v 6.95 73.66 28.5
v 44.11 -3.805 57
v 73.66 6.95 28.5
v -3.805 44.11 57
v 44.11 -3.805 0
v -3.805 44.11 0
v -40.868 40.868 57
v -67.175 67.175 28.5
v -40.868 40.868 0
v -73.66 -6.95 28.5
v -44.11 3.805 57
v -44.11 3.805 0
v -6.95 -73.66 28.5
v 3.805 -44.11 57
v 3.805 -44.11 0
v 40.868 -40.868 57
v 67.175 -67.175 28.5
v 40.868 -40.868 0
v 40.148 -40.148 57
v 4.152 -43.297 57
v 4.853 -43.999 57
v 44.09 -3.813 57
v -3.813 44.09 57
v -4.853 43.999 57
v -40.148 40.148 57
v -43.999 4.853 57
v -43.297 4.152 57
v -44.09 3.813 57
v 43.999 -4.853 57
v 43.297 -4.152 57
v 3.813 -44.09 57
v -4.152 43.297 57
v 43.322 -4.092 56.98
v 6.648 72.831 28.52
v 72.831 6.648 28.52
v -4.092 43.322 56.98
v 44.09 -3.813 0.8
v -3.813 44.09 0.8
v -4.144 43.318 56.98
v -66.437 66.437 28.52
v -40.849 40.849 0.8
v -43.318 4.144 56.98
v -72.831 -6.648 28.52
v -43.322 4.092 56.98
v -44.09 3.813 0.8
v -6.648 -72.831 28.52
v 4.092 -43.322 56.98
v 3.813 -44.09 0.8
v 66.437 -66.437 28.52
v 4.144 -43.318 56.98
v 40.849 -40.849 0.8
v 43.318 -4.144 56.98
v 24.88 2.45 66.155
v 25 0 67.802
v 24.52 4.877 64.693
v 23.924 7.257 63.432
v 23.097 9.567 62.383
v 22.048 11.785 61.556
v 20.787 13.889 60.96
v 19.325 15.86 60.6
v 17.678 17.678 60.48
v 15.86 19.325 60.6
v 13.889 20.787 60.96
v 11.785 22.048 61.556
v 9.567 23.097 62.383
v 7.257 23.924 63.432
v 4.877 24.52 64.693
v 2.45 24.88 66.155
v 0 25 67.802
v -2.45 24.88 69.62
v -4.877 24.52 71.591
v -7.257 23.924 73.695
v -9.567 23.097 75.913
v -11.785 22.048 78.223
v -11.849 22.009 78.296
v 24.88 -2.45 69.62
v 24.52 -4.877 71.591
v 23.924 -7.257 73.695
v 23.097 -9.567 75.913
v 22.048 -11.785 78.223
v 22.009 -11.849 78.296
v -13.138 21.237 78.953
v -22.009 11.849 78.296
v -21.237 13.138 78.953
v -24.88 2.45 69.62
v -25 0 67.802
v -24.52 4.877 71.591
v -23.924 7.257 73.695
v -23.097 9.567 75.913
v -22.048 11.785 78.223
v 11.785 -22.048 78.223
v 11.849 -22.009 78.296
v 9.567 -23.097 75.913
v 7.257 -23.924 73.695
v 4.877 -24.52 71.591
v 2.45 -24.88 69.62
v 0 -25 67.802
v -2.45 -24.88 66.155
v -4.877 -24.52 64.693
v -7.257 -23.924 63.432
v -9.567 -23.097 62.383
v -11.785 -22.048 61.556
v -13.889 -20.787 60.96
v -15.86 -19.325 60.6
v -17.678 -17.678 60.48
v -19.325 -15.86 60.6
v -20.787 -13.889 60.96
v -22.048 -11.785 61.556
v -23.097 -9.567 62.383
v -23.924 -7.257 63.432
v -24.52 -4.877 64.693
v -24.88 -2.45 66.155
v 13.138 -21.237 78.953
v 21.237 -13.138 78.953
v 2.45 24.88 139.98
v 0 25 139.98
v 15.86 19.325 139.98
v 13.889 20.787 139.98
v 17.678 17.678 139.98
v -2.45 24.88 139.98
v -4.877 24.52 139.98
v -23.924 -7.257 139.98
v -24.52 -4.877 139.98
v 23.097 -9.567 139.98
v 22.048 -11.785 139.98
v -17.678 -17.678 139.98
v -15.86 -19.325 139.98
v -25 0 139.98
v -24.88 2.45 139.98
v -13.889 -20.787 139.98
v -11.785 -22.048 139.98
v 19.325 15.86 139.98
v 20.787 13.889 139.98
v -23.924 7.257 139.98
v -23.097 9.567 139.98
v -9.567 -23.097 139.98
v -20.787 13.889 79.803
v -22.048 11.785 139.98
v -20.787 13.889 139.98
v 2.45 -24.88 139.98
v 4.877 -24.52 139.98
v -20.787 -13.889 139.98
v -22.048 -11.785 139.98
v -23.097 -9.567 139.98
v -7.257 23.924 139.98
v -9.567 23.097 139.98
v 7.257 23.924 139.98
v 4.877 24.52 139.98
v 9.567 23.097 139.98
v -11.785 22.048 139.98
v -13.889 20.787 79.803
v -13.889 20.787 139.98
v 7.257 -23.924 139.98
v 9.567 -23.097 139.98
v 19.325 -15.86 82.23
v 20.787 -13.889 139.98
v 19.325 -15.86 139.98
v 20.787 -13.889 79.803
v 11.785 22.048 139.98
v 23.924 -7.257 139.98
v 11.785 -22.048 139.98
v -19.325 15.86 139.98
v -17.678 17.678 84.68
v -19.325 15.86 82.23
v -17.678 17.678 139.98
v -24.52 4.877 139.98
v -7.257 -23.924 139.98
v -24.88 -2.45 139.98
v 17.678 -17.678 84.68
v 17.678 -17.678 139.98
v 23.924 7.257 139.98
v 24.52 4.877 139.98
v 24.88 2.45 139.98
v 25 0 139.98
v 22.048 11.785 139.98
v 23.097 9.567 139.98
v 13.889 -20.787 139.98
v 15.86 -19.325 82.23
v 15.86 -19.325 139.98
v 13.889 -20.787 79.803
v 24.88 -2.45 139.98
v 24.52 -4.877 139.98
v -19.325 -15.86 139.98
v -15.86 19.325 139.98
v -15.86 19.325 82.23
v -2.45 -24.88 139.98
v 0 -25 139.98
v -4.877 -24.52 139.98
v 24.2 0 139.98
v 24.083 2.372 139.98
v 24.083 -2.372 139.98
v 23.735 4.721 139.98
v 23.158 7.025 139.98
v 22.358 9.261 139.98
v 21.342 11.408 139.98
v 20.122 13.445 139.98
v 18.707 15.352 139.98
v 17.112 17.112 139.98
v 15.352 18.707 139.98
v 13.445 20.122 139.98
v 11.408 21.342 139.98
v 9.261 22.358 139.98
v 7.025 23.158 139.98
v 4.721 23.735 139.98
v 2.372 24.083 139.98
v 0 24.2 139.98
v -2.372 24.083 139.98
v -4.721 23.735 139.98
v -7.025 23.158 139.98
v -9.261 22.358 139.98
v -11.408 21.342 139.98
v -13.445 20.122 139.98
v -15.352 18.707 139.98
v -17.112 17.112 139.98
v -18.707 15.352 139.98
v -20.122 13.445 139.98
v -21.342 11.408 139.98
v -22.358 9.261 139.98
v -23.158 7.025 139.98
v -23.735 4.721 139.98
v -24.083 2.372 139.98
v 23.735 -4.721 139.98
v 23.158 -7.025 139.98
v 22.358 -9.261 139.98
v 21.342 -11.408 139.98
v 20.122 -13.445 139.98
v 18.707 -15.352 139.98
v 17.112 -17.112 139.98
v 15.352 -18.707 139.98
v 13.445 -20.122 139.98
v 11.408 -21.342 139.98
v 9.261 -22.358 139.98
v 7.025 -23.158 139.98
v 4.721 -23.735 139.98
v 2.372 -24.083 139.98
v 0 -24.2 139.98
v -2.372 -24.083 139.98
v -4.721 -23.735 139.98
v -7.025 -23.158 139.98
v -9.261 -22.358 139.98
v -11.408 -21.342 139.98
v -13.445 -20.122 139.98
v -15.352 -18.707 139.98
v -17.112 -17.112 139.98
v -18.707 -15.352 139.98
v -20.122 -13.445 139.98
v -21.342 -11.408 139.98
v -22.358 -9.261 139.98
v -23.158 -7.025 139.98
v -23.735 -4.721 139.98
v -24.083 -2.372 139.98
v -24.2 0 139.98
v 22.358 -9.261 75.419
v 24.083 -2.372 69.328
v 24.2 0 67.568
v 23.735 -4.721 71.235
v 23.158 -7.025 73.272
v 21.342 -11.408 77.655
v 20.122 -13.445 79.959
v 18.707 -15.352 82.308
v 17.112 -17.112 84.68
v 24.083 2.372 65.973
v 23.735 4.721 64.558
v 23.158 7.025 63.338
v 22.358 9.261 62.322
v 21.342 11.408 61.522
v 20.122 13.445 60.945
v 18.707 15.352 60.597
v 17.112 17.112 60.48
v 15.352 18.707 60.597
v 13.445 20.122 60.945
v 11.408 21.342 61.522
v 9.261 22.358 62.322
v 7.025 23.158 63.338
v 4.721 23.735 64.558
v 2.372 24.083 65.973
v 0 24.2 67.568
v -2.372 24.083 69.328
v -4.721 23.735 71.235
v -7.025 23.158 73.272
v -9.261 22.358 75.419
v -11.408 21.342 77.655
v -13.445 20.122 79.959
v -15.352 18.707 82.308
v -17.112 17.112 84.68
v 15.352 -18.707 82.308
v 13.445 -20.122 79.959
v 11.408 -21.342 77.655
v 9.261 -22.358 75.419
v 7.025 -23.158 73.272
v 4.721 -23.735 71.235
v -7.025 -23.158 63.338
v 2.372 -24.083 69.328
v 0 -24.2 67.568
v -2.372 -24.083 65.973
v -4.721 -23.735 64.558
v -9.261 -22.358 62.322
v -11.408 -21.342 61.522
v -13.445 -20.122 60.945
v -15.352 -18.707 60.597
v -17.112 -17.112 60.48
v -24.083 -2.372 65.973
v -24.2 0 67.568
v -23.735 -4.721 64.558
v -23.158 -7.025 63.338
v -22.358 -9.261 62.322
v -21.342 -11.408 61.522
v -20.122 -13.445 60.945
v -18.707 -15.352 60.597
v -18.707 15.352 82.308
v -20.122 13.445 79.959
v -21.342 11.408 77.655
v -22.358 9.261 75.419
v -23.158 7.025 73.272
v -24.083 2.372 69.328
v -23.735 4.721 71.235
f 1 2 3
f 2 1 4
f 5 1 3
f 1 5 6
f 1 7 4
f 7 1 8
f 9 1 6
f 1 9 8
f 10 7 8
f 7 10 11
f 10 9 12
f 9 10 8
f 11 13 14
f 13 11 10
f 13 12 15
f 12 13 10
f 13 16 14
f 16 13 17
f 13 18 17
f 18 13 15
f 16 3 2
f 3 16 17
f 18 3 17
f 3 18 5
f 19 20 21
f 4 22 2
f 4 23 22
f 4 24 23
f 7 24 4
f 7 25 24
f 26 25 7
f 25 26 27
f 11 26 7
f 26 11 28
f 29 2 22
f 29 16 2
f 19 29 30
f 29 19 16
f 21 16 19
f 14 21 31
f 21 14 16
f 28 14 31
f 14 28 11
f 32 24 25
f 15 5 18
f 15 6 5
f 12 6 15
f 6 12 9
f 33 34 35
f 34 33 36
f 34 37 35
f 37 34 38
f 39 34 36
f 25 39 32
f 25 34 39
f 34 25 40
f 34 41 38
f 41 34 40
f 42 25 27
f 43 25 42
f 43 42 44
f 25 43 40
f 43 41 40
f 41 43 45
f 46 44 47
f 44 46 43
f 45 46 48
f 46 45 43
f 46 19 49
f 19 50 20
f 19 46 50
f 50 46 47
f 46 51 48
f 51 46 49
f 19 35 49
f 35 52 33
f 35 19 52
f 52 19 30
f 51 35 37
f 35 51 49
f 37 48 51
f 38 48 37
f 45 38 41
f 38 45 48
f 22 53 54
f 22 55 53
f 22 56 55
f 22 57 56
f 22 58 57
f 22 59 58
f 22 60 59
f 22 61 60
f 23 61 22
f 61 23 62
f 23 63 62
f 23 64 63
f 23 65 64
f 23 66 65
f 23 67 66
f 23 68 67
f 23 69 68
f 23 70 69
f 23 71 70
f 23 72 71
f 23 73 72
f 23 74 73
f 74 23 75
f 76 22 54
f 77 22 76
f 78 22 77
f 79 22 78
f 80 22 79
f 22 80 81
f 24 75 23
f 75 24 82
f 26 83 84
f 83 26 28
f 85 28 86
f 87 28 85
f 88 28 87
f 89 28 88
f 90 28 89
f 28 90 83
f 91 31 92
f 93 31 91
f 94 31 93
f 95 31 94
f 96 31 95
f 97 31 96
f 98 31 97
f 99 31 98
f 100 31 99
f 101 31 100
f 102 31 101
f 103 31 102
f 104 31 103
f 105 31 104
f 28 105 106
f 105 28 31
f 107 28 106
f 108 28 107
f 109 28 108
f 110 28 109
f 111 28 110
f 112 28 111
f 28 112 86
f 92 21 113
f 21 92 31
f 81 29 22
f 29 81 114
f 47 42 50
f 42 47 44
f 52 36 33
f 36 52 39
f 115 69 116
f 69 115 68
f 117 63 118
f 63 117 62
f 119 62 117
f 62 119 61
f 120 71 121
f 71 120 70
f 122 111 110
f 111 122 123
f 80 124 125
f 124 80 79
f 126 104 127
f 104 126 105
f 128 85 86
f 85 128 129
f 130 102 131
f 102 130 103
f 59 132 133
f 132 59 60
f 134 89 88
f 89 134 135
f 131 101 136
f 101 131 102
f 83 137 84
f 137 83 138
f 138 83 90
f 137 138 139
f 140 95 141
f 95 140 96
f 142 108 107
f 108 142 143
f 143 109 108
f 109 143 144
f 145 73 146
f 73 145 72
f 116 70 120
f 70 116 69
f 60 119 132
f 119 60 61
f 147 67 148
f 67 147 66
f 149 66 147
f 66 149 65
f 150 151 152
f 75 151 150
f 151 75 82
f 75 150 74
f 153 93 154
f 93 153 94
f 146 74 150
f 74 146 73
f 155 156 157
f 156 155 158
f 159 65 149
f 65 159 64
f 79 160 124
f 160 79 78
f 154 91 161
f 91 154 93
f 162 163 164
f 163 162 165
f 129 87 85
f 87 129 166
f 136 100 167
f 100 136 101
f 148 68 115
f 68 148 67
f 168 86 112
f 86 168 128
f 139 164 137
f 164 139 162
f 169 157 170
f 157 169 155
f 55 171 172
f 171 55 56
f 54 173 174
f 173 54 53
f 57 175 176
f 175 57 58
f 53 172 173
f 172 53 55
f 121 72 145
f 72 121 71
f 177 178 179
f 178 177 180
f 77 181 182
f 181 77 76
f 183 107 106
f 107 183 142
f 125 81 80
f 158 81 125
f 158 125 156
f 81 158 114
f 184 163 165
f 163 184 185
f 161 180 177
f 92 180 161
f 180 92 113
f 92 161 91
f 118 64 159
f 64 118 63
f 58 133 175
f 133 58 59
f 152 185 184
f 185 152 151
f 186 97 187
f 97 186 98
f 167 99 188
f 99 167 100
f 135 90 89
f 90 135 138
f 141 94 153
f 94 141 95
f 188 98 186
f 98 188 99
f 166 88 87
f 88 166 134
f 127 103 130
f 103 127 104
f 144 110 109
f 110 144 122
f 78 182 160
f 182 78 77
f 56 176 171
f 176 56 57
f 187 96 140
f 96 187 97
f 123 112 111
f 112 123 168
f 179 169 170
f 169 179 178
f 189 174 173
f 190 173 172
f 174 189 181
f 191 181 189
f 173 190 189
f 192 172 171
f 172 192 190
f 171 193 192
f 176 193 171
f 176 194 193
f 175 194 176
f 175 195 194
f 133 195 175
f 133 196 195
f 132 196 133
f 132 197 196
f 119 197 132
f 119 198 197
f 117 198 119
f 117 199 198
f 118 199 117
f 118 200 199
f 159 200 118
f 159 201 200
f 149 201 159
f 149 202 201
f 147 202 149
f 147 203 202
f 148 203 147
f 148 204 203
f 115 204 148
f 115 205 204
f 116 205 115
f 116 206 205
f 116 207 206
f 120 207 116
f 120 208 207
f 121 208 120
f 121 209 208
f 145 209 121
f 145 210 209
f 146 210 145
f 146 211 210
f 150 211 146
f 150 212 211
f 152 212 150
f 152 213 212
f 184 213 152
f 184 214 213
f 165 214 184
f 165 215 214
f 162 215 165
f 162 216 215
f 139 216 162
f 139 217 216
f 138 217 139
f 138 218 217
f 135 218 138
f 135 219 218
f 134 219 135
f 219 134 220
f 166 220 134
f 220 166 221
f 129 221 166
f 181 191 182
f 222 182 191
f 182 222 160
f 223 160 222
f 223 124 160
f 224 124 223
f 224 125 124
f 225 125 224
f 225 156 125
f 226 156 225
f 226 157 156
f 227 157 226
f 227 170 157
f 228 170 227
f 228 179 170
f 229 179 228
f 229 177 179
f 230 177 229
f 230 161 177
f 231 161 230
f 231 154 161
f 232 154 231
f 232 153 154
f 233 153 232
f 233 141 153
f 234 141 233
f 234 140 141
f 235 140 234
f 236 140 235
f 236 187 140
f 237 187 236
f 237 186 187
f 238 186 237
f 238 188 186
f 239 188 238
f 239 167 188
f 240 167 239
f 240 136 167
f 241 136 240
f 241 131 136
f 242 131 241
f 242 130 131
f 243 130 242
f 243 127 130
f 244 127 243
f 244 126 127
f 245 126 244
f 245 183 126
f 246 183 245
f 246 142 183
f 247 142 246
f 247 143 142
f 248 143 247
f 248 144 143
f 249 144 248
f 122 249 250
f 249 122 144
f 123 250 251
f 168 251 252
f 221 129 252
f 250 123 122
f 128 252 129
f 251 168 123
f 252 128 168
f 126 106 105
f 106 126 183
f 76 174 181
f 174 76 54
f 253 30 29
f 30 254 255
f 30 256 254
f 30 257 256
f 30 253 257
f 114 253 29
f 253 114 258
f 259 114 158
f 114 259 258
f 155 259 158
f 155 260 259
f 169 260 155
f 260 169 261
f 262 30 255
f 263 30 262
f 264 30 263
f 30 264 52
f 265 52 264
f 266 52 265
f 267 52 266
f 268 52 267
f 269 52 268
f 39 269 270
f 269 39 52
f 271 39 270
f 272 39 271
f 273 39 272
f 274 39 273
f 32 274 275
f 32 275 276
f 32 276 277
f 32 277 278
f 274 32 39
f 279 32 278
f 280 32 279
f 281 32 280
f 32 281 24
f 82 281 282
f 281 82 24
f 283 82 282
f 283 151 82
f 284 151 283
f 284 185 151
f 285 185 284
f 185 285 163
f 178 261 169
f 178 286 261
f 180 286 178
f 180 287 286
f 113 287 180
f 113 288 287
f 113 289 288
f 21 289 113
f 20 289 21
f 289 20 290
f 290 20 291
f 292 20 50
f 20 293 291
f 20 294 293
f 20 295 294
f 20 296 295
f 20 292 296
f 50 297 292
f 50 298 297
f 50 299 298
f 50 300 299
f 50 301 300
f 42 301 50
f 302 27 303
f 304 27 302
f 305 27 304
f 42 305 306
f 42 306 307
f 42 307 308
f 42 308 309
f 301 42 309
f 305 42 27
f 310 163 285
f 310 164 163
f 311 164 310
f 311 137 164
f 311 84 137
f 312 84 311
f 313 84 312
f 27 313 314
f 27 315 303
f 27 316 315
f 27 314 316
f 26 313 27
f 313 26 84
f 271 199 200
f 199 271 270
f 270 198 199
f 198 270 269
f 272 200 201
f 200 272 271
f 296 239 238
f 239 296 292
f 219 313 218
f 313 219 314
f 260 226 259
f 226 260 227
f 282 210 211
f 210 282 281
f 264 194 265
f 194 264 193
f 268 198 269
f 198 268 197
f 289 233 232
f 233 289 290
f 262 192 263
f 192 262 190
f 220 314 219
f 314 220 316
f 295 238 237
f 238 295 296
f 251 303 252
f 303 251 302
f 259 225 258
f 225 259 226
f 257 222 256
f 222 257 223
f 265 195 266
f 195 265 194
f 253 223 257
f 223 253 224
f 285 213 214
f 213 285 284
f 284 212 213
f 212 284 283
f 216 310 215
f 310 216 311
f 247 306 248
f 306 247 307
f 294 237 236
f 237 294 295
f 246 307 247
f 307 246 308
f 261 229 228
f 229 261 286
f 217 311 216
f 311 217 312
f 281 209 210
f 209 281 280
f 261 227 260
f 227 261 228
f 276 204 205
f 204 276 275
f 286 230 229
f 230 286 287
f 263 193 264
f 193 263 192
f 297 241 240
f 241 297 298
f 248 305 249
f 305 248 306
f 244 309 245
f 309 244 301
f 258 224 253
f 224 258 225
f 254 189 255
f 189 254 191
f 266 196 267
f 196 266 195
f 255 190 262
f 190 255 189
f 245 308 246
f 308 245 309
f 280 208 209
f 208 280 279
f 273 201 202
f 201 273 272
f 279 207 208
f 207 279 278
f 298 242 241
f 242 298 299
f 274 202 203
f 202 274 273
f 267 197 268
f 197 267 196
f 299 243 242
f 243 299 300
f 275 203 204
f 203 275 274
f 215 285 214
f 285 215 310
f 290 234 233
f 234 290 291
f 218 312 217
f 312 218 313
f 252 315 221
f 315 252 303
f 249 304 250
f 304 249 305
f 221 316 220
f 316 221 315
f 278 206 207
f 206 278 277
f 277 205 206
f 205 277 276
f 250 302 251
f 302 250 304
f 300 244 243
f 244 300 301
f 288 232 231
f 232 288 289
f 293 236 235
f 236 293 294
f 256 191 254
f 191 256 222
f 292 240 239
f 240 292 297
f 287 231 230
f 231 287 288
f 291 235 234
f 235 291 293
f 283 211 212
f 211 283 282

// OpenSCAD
//----- Customizable constants

// preview[view:south, tilt:top]

/* [Printer/Slicer] */

// of the target printer
nozzle_diameter= 0.4;

// to be used by the slicer
layer_height= 0.2;

/* [Rupee Shape] */

rupee_length= 190;
rupee_edge_pitch= 45;
rupee_tip_angle= 100;
rupee_aspect_ratio= 0.6;
rupee_center_facet_ratio= 0.5;

rupee_bowl_wall_count= 2;
rupee_bowl_floor_count= 4; // NOTE: An even number of layers promotes symmetry on the central facet.

/* [Light Socket Connector] */

rupee_shade_total_height= 140;

light_socket_connector_top_diameter= 50;
light_socket_connector_face_count= 64;

/* [Hidden] */

// The connector slits was both unnecessary and created problems while printing.
light_socket_connector_slit_xy_size= 0; // 0 will remove the slit entirely. 

// The magnets turned out to be unnecessary, so it's completely untested.
light_socket_connector_magnet_count= 0;
magnet_diameter= 5.0;
magnet_socket_xy_gap= 0.1;
magnet_socket_z_gap= 0.2;
magnet_socket_wall_count= 2;
magnet_socket_floor_count= 2;
magnet_socket_ceiling_count= 2; // Either 0 if glueing in magnets, or just thick enough to ensure the magnets are contained.
magnet_socket_support_pitch= 45;
magnet_socket_face_count= 64;

//----- Private constants

function hidden(x)= x; // Used to hide values from the customizer app.

csg_overlap= hidden(0.02);

rupee_bowl_wall_xy_size= (nozzle_diameter * rupee_bowl_wall_count);
rupee_bowl_floor_z_size= (layer_height * rupee_bowl_floor_count);

rupee_y_size= rupee_length;
rupee_x_size= (rupee_y_size * rupee_aspect_ratio);

rupee_center_facet_x_size= (rupee_center_facet_ratio * rupee_x_size);

rupee_edge_facet_x_size= ((rupee_x_size / 2) - (rupee_center_facet_x_size / 2));
rupee_edge_facet_z_size= (rupee_edge_facet_x_size * tan(rupee_edge_pitch));

rupee_z_size= (2 * rupee_edge_facet_z_size);

rupee_max_size= (max(rupee_x_size, rupee_y_size, rupee_z_size) + (2 * csg_overlap));

light_socket_connector_z_size= (rupee_shade_total_height - rupee_z_size);

light_socket_connector_top_radius= (light_socket_connector_top_diameter / 2);

magnet_socket_cavity_xy_radius= ((magnet_diameter / 2) + magnet_socket_xy_gap);
magnet_socket_cavity_z_size= (magnet_socket_z_gap + magnet_diameter + magnet_socket_z_gap);
magnet_socket_wall_xy_size= (nozzle_diameter * magnet_socket_wall_count);
magnet_socket_floor_z_size= (layer_height * magnet_socket_floor_count);
magnet_socket_ceiling_z_size= (layer_height * magnet_socket_ceiling_count);

magnet_socket_xy_radius= (magnet_socket_cavity_xy_radius + magnet_socket_wall_xy_size);
magnet_socket_z_size= (magnet_socket_floor_z_size + magnet_socket_cavity_z_size + magnet_socket_ceiling_z_size);

magnet_socket_support_z_size= ((2 * magnet_socket_xy_radius) * tan(magnet_socket_support_pitch));

//----- Information

echo("rupee_center_facet_x_size:", rupee_center_facet_x_size);
echo("rupee_z_size:", rupee_z_size);
echo("magnet_insertion pause_at_z:", (rupee_shade_total_height - magnet_socket_ceiling_z_size));

//----- Implementation

module rupee_negative_top_edge()
{
	clipping_cube_x_size= (rupee_x_size / cos(rupee_edge_pitch));
	
	rotate([0, rupee_edge_pitch, 0])
	translate([-(clipping_cube_x_size / 2), -(rupee_max_size / 2), 0])
	cube(size= [
		clipping_cube_x_size,
		rupee_max_size,
		rupee_max_size]);
}

module rupee_negative_full_edge(
	xy_inset_size)
{
	translate([-xy_inset_size, 0, 0])
	{
		rupee_negative_top_edge();
		
		mirror([0, 0, 1])
		rupee_negative_top_edge();
	}
}

module rupee_negative_edges(
	xy_inset_size)
{
	// Right
	translate([(rupee_x_size / 2), 0, 0])
	rupee_negative_full_edge(xy_inset_size);
	
	// Top-Right
	translate([0, (rupee_y_size / 2), 0])
	rotate([0, 0, (rupee_tip_angle / 2)])
	rupee_negative_full_edge(xy_inset_size);
	
	// Top-Left
	translate([0, (rupee_y_size / 2), 0])
	mirror([1, 0, 0])
	rotate([0, 0, (rupee_tip_angle / 2)])
	rupee_negative_full_edge(xy_inset_size);
	
	// Left
	translate([-(rupee_x_size / 2), 0, 0])
	mirror([1, 0, 0])
	rupee_negative_full_edge(xy_inset_size);
	
	// Bottom-Left
	translate([0, -(rupee_y_size / 2), 0])
	mirror([1, 0, 0])
	rotate([0, 0, -(rupee_tip_angle / 2)])
	rupee_negative_full_edge(xy_inset_size);
	
	// Bottom-Right
	translate([0, -(rupee_y_size / 2), 0])
	rotate([0, 0, -(rupee_tip_angle / 2)])
	rupee_negative_full_edge(xy_inset_size);
}

module rupee_solid(
	xy_inset_size)
{
	translate([0, 0, (rupee_z_size / 2)])
	difference()
	{
		cube(
			size= [rupee_x_size, rupee_y_size, rupee_z_size],
			center= true);
		
		rupee_negative_edges(xy_inset_size= xy_inset_size);
	}
}

module rupee_bowl()
{
	difference()
	{
		rupee_solid(xy_inset_size= 0);
		
		difference()
		{
			translate([0, 0, csg_overlap])
			rupee_solid(
				xy_inset_size= rupee_bowl_wall_xy_size);
			
			translate([-(rupee_max_size / 2), -(rupee_max_size / 2), 0])
			cube(size= [
				rupee_max_size,
				rupee_max_size,
				rupee_bowl_floor_z_size]);
		}
	}
}

module magnet_socket()
{
	difference()
	{
		translate([
			-magnet_socket_xy_radius,
			0,
			-(magnet_socket_z_size + magnet_socket_support_z_size)])
		union()
		{
			cylinder(
				r= magnet_socket_xy_radius,
				h= (magnet_socket_z_size + magnet_socket_support_z_size),
				$fn= magnet_socket_face_count);
			
			translate([0, -magnet_socket_xy_radius, 0])
			cube(size= [
				magnet_socket_xy_radius,
				(2 * magnet_socket_xy_radius), 
				(magnet_socket_z_size + magnet_socket_support_z_size)]);
		}
		
		// Magnet cavity.
		translate([
			-magnet_socket_xy_radius,
			0,
			-(magnet_socket_cavity_z_size + magnet_socket_ceiling_z_size)])
		cylinder(
			r= magnet_socket_cavity_xy_radius,
			h= magnet_socket_cavity_z_size,
			$fn= magnet_socket_face_count);
			
		// Support bevel
		translate([
			-(2 * magnet_socket_xy_radius),
			0,
			-magnet_socket_z_size])
		rotate([0, -(90 - magnet_socket_support_pitch), 0])
		translate([
			-magnet_socket_support_z_size,
			-magnet_socket_xy_radius,
			-(2 * magnet_socket_support_z_size)])
		translate([0, -csg_overlap, 0])
		cube(size= [
			magnet_socket_support_z_size,
			((2 * magnet_socket_xy_radius) + (2 * csg_overlap)),
			(2 * magnet_socket_support_z_size)]);
	}
}

module light_socket_connector_exterior()
{
	cylinder(
		r= light_socket_connector_top_radius,
		h= light_socket_connector_z_size,
		$fn= light_socket_connector_face_count);
		
	difference()
	{
		translate([
			-(rupee_center_facet_x_size / 2),
			-(rupee_y_size / 2),
			0])
		cube(size= [
			rupee_center_facet_x_size,
			rupee_y_size,
			min((rupee_z_size / 2), light_socket_connector_z_size)]);
		
		translate([0, 0, -(rupee_z_size / 2)])
		rupee_negative_edges(xy_inset_size= 0);
	}
}

module light_socket_connector_negative_interior()
{
	translate([0, 0, -csg_overlap])
	cylinder(
		r= (light_socket_connector_top_radius - rupee_bowl_wall_xy_size),
		h= (csg_overlap + light_socket_connector_z_size + csg_overlap),
		$fn= light_socket_connector_face_count);
			
	intersection()
	{
		// Base X-Positive
		translate([((rupee_center_facet_x_size / 2) - rupee_bowl_wall_xy_size), 0, 0])
		rotate([0, -(90 - rupee_edge_pitch), 0])
		mirror([1, 0, 0])
		translate([0, -(rupee_max_size / 2), 0])
		cube(size= rupee_max_size);
		
		// Base X-Negative
		mirror([1, 0, 0])
		translate([((rupee_center_facet_x_size / 2) - rupee_bowl_wall_xy_size), 0, 0])
		rotate([0, -(90 - rupee_edge_pitch), 0])
		mirror([1, 0, 0])
		translate([0, -(rupee_max_size / 2), 0])
		cube(size= rupee_max_size);
	}
	
	// If the user needs the connector to be split to
	// allow the bulb to pass through.
	if (light_socket_connector_slit_xy_size > 0)
	{
		translate([
			-(light_socket_connector_slit_xy_size / 2),
			-(rupee_max_size / 2),
			0])
		cube(size= [
			light_socket_connector_slit_xy_size,
			rupee_max_size,
			(light_socket_connector_z_size + csg_overlap)]);
	}
}

module light_socket_connector_magnet_sockets()
{
	magnet_placement_angle= (360 / light_socket_connector_magnet_count);
	
	// NOTE: We must perform this check, otherwise the
	// culling-cylinder will become the only child passed
	// to intersection().
	if (light_socket_connector_magnet_count > 0)
	{
		intersection()
		{
			translate([0, 0, light_socket_connector_z_size])
			union()
			{
				for (index= [0 : (light_socket_connector_magnet_count - 1)])
				{
					rotate([0, 0, (90 + (index * magnet_placement_angle) + (magnet_placement_angle / 2))])
					translate([csg_overlap, 0, 0])
					translate([(light_socket_connector_top_radius - rupee_bowl_wall_xy_size), 0, 0])
					magnet_socket();
				}
			}
			
			// Ensure the magnet sockets don't poke out.
			cylinder(
				r= light_socket_connector_top_radius,
				h= light_socket_connector_z_size,
				$fn= light_socket_connector_face_count);
		}
	}
}

module light_socket_connector_whole()
{
	union()
	{
		difference()
		{
			light_socket_connector_exterior();
			
			light_socket_connector_negative_interior();
		}
		
		light_socket_connector_magnet_sockets();
	}
}

module rupee_shade()
{
	union()
	{
		rupee_bowl();

		translate([0, 0, -csg_overlap])
		translate([0, 0, rupee_z_size])
		light_socket_connector_whole();
	}
}

//----- Output

rotate([0, 0, 45]) // Rotate to better fit in the printer, while keeping the bottom-fill symmetrical to look nice. (could fit better with a different angle, but the bottom surface would be asymmetrical)
//rupee_bowl();
//light_socket_connector_whole();
rupee_shade();
